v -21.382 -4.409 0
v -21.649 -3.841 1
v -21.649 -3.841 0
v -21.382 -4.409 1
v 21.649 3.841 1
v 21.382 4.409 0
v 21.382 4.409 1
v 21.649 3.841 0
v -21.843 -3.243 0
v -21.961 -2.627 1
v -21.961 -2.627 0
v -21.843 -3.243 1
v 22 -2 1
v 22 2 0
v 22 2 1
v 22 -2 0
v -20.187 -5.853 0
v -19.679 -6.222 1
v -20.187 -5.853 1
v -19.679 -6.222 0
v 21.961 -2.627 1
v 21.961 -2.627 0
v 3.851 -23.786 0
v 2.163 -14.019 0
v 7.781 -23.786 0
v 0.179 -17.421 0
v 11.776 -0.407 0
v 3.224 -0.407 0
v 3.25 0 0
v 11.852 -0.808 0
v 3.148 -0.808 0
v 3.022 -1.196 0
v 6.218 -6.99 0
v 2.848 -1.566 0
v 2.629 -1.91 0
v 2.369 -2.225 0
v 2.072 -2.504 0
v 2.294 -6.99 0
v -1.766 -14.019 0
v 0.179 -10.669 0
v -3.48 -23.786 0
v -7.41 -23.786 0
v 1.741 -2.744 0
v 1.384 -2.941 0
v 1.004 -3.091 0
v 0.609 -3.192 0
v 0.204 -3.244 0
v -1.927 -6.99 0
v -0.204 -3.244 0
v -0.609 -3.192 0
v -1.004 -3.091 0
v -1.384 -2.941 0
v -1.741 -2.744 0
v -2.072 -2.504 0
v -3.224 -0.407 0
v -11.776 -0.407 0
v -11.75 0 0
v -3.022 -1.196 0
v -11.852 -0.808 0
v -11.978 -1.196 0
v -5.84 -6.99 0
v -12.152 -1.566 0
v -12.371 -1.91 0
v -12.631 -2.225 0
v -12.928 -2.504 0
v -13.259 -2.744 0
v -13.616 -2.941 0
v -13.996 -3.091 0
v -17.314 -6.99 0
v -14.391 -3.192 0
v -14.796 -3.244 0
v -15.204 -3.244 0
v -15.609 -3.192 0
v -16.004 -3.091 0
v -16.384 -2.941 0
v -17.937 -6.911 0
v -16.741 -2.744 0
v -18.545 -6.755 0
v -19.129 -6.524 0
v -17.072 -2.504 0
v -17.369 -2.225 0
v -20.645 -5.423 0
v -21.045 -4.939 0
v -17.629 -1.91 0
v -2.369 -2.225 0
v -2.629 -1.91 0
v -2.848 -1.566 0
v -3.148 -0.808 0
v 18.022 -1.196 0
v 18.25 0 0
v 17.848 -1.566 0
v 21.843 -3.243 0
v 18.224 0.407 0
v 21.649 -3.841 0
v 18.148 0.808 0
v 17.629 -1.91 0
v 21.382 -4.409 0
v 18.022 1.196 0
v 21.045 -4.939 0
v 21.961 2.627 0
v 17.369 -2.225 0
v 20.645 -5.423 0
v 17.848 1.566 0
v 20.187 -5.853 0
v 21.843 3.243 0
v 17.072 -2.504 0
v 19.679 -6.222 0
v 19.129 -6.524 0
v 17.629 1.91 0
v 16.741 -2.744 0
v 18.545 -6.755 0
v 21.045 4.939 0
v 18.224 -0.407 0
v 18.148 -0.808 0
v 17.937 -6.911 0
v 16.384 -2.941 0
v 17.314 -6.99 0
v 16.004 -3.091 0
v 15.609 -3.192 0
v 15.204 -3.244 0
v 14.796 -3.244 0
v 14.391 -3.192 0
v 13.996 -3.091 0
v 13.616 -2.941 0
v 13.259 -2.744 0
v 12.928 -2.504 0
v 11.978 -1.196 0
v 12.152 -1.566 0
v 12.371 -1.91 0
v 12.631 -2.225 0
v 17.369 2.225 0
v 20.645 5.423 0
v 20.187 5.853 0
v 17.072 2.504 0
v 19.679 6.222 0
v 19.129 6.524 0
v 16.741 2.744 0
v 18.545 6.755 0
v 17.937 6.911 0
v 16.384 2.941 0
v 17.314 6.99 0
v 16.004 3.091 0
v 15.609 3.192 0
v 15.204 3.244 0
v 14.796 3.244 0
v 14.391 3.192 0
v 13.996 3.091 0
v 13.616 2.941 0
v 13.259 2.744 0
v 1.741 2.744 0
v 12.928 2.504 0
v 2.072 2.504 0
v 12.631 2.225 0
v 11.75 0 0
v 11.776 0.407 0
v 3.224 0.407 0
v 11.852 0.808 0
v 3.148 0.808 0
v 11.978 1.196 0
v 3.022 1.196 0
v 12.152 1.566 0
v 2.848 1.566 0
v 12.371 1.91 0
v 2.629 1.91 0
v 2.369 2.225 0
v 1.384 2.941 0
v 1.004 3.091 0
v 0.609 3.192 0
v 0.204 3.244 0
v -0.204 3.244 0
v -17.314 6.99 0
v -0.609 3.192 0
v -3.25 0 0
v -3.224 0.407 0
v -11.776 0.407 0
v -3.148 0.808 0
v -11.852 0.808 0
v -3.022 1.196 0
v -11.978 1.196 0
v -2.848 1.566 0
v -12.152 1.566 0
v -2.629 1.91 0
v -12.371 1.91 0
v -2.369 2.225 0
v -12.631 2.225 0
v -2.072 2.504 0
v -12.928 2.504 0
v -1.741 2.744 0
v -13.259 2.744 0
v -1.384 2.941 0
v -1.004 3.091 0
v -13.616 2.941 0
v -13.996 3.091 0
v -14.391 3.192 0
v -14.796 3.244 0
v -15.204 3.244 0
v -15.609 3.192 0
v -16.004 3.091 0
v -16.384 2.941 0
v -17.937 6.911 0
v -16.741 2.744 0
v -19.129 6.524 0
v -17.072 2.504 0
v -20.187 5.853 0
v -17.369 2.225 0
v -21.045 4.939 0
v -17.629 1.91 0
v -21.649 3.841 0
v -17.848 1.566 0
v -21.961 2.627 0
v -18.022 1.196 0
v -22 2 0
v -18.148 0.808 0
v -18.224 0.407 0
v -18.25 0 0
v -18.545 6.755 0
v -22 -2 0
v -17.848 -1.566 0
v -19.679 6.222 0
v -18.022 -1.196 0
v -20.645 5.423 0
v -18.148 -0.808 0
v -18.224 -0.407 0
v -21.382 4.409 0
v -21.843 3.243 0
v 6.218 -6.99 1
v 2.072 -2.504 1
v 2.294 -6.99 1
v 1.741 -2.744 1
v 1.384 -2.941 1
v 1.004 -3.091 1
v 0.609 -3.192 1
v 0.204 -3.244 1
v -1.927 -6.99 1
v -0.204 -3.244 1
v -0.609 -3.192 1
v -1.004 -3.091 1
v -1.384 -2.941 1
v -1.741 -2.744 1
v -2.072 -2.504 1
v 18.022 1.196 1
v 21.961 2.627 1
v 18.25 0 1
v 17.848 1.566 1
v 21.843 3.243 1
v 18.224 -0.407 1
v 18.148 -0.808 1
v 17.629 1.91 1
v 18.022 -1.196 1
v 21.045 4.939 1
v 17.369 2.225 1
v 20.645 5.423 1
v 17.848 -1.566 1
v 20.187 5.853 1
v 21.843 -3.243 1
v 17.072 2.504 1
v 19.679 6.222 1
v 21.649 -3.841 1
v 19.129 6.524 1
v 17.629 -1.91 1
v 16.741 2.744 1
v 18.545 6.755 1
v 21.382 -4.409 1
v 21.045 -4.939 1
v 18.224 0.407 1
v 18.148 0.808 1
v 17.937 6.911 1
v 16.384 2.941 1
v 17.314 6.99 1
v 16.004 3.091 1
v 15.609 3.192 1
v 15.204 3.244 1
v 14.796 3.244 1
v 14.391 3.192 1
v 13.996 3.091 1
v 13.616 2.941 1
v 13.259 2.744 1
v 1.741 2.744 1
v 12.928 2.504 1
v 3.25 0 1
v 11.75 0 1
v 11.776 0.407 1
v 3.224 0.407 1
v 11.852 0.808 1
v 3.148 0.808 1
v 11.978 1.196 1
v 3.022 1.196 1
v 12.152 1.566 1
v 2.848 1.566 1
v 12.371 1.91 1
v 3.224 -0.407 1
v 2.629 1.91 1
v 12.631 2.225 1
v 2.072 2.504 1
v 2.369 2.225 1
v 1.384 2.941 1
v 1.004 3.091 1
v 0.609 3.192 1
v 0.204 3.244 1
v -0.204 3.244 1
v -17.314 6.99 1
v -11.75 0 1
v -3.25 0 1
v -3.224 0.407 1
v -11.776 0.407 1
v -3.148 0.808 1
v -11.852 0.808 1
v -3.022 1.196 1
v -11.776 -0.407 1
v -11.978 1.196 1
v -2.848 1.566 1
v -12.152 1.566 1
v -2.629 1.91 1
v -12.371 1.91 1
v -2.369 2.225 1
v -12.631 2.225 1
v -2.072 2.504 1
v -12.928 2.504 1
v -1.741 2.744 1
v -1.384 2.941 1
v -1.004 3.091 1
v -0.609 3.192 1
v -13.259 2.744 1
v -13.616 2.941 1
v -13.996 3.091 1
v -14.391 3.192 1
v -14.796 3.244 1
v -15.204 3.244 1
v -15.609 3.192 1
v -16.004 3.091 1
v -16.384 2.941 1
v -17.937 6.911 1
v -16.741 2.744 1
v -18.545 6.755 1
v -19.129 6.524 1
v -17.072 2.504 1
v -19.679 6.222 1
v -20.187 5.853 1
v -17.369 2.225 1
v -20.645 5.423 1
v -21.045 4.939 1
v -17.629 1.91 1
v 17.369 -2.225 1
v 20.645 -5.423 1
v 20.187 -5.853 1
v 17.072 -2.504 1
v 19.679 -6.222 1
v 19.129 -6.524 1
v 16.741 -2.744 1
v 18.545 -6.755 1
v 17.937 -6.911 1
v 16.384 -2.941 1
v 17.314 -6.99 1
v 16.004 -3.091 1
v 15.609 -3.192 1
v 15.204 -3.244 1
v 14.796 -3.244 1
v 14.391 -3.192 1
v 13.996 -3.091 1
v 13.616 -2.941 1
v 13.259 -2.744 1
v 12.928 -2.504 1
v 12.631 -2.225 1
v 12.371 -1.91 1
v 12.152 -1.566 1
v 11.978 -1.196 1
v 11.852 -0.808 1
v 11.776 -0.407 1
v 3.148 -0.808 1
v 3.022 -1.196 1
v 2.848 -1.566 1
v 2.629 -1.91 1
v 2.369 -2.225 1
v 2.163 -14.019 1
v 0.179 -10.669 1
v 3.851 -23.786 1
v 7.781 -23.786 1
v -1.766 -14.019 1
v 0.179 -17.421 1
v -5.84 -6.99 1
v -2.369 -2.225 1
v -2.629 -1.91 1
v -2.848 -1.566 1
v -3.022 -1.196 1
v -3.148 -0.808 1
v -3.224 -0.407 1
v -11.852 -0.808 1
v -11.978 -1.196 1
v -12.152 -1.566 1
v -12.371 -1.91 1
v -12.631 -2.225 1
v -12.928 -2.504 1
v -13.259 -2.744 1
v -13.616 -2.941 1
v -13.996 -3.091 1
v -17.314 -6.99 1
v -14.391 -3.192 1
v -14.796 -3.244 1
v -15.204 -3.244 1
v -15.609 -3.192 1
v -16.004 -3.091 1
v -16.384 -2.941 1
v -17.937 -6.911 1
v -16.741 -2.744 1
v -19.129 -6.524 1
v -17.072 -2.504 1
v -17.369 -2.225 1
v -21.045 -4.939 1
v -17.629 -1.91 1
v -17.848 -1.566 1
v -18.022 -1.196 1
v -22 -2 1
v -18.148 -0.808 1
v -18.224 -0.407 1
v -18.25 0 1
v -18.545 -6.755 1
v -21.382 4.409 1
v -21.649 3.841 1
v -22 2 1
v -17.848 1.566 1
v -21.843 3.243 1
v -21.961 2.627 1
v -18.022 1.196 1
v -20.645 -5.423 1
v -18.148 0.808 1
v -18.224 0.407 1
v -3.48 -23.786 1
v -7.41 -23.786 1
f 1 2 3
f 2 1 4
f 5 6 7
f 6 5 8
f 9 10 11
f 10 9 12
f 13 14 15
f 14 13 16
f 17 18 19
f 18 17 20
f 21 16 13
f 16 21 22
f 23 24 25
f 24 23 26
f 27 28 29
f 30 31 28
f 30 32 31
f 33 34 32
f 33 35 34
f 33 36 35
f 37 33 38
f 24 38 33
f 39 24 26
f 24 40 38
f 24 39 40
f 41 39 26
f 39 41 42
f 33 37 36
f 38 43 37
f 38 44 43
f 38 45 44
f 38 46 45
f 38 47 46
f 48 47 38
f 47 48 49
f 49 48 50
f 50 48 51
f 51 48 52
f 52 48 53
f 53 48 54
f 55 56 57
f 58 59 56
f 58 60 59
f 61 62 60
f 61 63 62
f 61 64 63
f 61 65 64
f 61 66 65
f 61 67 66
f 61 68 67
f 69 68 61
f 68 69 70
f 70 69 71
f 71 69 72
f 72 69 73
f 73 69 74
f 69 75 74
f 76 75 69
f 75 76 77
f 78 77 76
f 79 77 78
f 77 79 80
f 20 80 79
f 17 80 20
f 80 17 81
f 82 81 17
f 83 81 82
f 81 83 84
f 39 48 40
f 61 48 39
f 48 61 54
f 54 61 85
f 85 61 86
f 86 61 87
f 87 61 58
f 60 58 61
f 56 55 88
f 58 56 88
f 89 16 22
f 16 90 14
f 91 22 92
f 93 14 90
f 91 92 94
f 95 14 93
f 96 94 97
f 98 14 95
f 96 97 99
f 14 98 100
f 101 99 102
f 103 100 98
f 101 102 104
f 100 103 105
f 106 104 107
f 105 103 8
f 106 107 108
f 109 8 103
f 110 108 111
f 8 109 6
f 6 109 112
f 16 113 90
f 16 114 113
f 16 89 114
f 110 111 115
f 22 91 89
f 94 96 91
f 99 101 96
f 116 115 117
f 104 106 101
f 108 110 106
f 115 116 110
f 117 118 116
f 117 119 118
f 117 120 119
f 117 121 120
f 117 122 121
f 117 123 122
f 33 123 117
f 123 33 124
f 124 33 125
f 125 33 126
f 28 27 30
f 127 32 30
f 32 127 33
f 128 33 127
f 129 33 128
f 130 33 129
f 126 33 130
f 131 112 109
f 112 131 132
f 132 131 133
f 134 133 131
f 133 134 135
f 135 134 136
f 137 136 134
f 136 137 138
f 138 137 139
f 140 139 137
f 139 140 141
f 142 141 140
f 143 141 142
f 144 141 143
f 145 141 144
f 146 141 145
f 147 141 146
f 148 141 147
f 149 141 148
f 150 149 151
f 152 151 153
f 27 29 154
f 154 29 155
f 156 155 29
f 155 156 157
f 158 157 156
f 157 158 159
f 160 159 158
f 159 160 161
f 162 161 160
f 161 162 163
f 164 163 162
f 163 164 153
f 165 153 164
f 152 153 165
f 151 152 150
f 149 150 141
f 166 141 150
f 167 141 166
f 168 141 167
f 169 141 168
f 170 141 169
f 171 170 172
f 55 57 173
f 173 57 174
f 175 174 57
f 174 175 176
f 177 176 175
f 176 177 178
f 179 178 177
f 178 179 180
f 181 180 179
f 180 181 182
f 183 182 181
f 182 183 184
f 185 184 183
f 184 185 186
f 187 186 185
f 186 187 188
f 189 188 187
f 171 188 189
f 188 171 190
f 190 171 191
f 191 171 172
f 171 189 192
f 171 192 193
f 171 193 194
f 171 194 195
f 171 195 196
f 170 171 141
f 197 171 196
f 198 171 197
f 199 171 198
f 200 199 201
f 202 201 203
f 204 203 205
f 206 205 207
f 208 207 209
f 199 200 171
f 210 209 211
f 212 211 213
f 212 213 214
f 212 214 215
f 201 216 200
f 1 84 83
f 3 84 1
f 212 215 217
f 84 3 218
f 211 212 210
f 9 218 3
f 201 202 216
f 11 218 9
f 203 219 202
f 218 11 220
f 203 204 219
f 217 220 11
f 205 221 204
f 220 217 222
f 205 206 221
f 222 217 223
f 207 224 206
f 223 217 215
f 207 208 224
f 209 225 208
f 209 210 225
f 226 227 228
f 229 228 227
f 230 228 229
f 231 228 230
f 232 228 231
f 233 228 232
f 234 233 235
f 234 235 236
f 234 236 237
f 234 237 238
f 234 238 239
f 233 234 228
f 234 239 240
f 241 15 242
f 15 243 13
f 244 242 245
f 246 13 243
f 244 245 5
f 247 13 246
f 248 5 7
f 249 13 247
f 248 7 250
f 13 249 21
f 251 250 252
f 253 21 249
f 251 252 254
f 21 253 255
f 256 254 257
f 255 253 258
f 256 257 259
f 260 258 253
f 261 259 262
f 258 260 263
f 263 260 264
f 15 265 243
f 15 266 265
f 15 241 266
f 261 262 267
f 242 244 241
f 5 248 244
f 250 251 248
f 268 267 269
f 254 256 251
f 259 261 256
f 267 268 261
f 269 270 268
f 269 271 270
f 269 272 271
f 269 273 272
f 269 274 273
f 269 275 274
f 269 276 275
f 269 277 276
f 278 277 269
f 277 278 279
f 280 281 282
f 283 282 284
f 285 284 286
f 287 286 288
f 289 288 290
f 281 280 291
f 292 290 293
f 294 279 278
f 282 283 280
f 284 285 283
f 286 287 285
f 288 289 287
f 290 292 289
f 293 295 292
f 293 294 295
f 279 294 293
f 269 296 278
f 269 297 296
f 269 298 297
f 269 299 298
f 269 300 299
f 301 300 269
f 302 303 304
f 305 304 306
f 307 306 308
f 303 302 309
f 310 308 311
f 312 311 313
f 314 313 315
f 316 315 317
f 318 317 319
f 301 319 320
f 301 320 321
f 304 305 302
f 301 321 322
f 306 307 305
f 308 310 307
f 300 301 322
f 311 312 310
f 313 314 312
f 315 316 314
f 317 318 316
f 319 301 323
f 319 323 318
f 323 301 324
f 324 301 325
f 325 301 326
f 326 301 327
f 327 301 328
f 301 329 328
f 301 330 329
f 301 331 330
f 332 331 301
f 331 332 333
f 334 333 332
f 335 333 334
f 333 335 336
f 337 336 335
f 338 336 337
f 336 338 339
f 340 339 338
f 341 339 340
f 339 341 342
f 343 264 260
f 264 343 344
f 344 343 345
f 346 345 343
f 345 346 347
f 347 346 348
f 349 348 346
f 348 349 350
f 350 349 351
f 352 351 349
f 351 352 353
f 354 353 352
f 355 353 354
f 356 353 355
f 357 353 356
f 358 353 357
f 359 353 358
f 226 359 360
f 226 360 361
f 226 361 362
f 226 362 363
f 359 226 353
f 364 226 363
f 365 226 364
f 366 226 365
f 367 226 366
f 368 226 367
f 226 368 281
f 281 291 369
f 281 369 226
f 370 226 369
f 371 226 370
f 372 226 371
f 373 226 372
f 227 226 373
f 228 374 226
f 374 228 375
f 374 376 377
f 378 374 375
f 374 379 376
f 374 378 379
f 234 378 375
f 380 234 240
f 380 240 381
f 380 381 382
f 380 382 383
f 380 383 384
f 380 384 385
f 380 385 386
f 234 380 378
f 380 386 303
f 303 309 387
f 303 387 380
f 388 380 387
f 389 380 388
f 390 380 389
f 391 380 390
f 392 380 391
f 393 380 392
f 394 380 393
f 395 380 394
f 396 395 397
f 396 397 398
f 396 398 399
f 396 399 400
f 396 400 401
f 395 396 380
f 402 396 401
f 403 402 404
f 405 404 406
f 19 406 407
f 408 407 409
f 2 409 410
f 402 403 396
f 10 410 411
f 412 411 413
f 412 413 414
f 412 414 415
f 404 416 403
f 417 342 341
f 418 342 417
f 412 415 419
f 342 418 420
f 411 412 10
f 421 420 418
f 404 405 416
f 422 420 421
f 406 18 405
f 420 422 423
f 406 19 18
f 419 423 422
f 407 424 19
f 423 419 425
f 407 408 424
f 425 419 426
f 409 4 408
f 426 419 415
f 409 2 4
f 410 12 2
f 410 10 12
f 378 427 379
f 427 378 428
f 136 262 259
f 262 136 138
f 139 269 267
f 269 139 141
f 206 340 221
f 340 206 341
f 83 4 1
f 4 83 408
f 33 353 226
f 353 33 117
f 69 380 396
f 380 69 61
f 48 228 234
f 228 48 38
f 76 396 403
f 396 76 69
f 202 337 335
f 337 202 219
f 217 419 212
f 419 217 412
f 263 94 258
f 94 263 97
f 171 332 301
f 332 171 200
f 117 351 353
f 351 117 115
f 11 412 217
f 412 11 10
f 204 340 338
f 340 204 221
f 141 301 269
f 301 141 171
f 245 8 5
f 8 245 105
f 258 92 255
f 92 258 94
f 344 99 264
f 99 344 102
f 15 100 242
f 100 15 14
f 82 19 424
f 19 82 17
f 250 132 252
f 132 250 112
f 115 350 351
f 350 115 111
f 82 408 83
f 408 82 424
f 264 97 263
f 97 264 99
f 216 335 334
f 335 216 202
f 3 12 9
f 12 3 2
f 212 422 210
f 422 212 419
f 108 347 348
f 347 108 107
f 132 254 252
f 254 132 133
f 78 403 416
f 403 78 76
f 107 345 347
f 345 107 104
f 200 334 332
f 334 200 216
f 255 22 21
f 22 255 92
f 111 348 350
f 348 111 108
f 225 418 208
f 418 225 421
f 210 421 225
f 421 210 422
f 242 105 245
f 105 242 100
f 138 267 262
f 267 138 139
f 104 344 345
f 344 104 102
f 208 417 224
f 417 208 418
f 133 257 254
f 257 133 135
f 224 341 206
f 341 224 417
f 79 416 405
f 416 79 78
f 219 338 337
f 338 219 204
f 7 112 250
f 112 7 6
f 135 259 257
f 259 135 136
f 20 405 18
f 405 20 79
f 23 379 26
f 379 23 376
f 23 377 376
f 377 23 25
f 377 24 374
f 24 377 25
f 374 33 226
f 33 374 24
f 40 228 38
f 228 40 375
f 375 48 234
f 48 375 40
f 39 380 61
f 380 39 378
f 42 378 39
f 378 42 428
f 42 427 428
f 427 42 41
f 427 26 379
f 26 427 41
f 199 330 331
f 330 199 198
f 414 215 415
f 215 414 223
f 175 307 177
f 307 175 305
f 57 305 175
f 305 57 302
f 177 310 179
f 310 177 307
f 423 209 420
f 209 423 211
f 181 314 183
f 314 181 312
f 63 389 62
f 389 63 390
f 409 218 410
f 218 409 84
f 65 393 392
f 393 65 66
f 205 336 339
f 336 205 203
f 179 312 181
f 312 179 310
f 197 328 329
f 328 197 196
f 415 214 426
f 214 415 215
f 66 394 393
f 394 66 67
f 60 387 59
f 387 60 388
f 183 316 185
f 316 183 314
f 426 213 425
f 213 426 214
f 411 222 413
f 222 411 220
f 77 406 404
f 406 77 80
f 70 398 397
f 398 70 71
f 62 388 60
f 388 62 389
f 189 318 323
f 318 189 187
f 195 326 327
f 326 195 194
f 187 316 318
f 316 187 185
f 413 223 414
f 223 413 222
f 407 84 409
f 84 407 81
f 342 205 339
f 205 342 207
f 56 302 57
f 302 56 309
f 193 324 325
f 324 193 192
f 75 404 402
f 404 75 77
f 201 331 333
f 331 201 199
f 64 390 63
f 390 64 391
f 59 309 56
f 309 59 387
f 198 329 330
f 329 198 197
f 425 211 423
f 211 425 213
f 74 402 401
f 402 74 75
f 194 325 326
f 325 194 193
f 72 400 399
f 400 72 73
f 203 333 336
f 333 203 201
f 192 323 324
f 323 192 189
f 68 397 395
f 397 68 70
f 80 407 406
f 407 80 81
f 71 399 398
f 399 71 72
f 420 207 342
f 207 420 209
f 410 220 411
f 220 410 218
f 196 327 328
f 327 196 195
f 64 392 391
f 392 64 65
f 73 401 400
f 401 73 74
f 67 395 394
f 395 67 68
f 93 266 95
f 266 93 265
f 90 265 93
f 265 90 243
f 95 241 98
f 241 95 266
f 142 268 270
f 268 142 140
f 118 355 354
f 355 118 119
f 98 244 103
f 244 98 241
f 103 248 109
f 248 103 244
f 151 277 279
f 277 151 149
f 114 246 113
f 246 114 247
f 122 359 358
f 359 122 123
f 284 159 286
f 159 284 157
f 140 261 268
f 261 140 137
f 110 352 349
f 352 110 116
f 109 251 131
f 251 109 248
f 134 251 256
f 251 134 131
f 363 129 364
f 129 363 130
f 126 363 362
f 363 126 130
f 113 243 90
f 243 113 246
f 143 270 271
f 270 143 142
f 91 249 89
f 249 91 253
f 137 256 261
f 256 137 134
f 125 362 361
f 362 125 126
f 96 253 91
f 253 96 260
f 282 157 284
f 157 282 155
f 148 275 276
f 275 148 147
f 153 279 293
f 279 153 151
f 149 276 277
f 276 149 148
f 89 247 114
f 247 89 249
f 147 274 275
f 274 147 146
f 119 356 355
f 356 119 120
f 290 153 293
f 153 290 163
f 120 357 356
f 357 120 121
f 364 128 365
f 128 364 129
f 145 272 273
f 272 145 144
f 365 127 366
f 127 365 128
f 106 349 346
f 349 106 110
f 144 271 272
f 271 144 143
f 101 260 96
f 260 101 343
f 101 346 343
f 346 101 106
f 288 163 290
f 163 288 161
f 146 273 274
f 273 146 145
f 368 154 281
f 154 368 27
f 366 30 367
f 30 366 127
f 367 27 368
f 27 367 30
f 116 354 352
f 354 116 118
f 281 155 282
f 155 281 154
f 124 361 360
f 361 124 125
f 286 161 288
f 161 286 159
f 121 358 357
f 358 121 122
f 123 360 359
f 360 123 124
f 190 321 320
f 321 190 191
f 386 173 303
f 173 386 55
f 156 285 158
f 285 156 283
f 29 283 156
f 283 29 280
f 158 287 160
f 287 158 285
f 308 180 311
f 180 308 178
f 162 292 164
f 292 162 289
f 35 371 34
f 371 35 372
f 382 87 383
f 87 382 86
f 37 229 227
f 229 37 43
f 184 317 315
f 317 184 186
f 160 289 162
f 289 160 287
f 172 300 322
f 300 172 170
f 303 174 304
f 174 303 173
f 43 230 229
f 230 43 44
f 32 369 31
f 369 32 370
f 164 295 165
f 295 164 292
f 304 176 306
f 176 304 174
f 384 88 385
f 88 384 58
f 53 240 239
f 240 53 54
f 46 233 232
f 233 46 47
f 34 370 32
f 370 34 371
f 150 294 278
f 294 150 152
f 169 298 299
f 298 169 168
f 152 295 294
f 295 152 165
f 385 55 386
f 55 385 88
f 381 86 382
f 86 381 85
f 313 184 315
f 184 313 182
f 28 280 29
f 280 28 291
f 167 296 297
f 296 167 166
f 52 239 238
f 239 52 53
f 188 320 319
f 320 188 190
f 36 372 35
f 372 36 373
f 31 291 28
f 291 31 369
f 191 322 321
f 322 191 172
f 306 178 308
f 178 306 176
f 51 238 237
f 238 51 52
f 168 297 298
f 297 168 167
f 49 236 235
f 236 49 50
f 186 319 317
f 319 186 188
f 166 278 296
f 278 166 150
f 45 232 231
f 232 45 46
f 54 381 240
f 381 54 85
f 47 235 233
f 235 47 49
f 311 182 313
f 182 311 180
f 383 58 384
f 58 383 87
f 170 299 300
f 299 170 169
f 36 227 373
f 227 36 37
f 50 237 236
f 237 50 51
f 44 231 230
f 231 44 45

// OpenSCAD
$fn = 50;


difference() {
	union() {
		translate(v = [0, 0, 0]) {
			rotate(a = [0, 0, 0]) {
				hull() {
					translate(v = [-17.0000000000, 2.0000000000, 0]) {
						rotate(a = [0, 0, 0]) {
							translate(v = [0, 0, 0]) {
								rotate(a = [0, 0, 0]) {
									cylinder(h = 1, r = 5);
								}
							}
						}
					}
					translate(v = [17.0000000000, 2.0000000000, 0]) {
						rotate(a = [0, 0, 0]) {
							translate(v = [0, 0, 0]) {
								rotate(a = [0, 0, 0]) {
									cylinder(h = 1, r = 5);
								}
							}
						}
					}
					translate(v = [-17.0000000000, -2.0000000000, 0]) {
						rotate(a = [0, 0, 0]) {
							translate(v = [0, 0, 0]) {
								rotate(a = [0, 0, 0]) {
									cylinder(h = 1, r = 5);
								}
							}
						}
					}
					translate(v = [17.0000000000, -2.0000000000, 0]) {
						rotate(a = [0, 0, 0]) {
							translate(v = [0, 0, 0]) {
								rotate(a = [0, 0, 0]) {
									cylinder(h = 1, r = 5);
								}
							}
						}
					}
				}
			}
		}
		translate(v = [0, -5, 0]) {
			rotate(a = [0, 0, 0]) {
				linear_extrude(height = 1) {
					text(font = "DejaVu Sans Mono:style=Bold", halign = "center", size = 19.0000000000, text = "X", valign = "top");
				}
			}
		}
	}
	union() {
		translate(v = [-15.0000000000, 0.0000000000, -125.0000000000]) {
			rotate(a = [0, 0, 0]) {
				cylinder(h = 250, r = 3.2500000000);
			}
		}
		translate(v = [15.0000000000, 0.0000000000, -125.0000000000]) {
			rotate(a = [0, 0, 0]) {
				cylinder(h = 250, r = 3.2500000000);
			}
		}
		translate(v = [15.0000000000, 0.0000000000, -125.0000000000]) {
			rotate(a = [0, 0, 0]) {
				cylinder(h = 250, r = 3.2500000000);
			}
		}
		translate(v = [0, 0, -125.0000000000]) {
			rotate(a = [0, 0, 0]) {
				cylinder(h = 250, r = 3.2500000000);
			}
		}
	}
}
